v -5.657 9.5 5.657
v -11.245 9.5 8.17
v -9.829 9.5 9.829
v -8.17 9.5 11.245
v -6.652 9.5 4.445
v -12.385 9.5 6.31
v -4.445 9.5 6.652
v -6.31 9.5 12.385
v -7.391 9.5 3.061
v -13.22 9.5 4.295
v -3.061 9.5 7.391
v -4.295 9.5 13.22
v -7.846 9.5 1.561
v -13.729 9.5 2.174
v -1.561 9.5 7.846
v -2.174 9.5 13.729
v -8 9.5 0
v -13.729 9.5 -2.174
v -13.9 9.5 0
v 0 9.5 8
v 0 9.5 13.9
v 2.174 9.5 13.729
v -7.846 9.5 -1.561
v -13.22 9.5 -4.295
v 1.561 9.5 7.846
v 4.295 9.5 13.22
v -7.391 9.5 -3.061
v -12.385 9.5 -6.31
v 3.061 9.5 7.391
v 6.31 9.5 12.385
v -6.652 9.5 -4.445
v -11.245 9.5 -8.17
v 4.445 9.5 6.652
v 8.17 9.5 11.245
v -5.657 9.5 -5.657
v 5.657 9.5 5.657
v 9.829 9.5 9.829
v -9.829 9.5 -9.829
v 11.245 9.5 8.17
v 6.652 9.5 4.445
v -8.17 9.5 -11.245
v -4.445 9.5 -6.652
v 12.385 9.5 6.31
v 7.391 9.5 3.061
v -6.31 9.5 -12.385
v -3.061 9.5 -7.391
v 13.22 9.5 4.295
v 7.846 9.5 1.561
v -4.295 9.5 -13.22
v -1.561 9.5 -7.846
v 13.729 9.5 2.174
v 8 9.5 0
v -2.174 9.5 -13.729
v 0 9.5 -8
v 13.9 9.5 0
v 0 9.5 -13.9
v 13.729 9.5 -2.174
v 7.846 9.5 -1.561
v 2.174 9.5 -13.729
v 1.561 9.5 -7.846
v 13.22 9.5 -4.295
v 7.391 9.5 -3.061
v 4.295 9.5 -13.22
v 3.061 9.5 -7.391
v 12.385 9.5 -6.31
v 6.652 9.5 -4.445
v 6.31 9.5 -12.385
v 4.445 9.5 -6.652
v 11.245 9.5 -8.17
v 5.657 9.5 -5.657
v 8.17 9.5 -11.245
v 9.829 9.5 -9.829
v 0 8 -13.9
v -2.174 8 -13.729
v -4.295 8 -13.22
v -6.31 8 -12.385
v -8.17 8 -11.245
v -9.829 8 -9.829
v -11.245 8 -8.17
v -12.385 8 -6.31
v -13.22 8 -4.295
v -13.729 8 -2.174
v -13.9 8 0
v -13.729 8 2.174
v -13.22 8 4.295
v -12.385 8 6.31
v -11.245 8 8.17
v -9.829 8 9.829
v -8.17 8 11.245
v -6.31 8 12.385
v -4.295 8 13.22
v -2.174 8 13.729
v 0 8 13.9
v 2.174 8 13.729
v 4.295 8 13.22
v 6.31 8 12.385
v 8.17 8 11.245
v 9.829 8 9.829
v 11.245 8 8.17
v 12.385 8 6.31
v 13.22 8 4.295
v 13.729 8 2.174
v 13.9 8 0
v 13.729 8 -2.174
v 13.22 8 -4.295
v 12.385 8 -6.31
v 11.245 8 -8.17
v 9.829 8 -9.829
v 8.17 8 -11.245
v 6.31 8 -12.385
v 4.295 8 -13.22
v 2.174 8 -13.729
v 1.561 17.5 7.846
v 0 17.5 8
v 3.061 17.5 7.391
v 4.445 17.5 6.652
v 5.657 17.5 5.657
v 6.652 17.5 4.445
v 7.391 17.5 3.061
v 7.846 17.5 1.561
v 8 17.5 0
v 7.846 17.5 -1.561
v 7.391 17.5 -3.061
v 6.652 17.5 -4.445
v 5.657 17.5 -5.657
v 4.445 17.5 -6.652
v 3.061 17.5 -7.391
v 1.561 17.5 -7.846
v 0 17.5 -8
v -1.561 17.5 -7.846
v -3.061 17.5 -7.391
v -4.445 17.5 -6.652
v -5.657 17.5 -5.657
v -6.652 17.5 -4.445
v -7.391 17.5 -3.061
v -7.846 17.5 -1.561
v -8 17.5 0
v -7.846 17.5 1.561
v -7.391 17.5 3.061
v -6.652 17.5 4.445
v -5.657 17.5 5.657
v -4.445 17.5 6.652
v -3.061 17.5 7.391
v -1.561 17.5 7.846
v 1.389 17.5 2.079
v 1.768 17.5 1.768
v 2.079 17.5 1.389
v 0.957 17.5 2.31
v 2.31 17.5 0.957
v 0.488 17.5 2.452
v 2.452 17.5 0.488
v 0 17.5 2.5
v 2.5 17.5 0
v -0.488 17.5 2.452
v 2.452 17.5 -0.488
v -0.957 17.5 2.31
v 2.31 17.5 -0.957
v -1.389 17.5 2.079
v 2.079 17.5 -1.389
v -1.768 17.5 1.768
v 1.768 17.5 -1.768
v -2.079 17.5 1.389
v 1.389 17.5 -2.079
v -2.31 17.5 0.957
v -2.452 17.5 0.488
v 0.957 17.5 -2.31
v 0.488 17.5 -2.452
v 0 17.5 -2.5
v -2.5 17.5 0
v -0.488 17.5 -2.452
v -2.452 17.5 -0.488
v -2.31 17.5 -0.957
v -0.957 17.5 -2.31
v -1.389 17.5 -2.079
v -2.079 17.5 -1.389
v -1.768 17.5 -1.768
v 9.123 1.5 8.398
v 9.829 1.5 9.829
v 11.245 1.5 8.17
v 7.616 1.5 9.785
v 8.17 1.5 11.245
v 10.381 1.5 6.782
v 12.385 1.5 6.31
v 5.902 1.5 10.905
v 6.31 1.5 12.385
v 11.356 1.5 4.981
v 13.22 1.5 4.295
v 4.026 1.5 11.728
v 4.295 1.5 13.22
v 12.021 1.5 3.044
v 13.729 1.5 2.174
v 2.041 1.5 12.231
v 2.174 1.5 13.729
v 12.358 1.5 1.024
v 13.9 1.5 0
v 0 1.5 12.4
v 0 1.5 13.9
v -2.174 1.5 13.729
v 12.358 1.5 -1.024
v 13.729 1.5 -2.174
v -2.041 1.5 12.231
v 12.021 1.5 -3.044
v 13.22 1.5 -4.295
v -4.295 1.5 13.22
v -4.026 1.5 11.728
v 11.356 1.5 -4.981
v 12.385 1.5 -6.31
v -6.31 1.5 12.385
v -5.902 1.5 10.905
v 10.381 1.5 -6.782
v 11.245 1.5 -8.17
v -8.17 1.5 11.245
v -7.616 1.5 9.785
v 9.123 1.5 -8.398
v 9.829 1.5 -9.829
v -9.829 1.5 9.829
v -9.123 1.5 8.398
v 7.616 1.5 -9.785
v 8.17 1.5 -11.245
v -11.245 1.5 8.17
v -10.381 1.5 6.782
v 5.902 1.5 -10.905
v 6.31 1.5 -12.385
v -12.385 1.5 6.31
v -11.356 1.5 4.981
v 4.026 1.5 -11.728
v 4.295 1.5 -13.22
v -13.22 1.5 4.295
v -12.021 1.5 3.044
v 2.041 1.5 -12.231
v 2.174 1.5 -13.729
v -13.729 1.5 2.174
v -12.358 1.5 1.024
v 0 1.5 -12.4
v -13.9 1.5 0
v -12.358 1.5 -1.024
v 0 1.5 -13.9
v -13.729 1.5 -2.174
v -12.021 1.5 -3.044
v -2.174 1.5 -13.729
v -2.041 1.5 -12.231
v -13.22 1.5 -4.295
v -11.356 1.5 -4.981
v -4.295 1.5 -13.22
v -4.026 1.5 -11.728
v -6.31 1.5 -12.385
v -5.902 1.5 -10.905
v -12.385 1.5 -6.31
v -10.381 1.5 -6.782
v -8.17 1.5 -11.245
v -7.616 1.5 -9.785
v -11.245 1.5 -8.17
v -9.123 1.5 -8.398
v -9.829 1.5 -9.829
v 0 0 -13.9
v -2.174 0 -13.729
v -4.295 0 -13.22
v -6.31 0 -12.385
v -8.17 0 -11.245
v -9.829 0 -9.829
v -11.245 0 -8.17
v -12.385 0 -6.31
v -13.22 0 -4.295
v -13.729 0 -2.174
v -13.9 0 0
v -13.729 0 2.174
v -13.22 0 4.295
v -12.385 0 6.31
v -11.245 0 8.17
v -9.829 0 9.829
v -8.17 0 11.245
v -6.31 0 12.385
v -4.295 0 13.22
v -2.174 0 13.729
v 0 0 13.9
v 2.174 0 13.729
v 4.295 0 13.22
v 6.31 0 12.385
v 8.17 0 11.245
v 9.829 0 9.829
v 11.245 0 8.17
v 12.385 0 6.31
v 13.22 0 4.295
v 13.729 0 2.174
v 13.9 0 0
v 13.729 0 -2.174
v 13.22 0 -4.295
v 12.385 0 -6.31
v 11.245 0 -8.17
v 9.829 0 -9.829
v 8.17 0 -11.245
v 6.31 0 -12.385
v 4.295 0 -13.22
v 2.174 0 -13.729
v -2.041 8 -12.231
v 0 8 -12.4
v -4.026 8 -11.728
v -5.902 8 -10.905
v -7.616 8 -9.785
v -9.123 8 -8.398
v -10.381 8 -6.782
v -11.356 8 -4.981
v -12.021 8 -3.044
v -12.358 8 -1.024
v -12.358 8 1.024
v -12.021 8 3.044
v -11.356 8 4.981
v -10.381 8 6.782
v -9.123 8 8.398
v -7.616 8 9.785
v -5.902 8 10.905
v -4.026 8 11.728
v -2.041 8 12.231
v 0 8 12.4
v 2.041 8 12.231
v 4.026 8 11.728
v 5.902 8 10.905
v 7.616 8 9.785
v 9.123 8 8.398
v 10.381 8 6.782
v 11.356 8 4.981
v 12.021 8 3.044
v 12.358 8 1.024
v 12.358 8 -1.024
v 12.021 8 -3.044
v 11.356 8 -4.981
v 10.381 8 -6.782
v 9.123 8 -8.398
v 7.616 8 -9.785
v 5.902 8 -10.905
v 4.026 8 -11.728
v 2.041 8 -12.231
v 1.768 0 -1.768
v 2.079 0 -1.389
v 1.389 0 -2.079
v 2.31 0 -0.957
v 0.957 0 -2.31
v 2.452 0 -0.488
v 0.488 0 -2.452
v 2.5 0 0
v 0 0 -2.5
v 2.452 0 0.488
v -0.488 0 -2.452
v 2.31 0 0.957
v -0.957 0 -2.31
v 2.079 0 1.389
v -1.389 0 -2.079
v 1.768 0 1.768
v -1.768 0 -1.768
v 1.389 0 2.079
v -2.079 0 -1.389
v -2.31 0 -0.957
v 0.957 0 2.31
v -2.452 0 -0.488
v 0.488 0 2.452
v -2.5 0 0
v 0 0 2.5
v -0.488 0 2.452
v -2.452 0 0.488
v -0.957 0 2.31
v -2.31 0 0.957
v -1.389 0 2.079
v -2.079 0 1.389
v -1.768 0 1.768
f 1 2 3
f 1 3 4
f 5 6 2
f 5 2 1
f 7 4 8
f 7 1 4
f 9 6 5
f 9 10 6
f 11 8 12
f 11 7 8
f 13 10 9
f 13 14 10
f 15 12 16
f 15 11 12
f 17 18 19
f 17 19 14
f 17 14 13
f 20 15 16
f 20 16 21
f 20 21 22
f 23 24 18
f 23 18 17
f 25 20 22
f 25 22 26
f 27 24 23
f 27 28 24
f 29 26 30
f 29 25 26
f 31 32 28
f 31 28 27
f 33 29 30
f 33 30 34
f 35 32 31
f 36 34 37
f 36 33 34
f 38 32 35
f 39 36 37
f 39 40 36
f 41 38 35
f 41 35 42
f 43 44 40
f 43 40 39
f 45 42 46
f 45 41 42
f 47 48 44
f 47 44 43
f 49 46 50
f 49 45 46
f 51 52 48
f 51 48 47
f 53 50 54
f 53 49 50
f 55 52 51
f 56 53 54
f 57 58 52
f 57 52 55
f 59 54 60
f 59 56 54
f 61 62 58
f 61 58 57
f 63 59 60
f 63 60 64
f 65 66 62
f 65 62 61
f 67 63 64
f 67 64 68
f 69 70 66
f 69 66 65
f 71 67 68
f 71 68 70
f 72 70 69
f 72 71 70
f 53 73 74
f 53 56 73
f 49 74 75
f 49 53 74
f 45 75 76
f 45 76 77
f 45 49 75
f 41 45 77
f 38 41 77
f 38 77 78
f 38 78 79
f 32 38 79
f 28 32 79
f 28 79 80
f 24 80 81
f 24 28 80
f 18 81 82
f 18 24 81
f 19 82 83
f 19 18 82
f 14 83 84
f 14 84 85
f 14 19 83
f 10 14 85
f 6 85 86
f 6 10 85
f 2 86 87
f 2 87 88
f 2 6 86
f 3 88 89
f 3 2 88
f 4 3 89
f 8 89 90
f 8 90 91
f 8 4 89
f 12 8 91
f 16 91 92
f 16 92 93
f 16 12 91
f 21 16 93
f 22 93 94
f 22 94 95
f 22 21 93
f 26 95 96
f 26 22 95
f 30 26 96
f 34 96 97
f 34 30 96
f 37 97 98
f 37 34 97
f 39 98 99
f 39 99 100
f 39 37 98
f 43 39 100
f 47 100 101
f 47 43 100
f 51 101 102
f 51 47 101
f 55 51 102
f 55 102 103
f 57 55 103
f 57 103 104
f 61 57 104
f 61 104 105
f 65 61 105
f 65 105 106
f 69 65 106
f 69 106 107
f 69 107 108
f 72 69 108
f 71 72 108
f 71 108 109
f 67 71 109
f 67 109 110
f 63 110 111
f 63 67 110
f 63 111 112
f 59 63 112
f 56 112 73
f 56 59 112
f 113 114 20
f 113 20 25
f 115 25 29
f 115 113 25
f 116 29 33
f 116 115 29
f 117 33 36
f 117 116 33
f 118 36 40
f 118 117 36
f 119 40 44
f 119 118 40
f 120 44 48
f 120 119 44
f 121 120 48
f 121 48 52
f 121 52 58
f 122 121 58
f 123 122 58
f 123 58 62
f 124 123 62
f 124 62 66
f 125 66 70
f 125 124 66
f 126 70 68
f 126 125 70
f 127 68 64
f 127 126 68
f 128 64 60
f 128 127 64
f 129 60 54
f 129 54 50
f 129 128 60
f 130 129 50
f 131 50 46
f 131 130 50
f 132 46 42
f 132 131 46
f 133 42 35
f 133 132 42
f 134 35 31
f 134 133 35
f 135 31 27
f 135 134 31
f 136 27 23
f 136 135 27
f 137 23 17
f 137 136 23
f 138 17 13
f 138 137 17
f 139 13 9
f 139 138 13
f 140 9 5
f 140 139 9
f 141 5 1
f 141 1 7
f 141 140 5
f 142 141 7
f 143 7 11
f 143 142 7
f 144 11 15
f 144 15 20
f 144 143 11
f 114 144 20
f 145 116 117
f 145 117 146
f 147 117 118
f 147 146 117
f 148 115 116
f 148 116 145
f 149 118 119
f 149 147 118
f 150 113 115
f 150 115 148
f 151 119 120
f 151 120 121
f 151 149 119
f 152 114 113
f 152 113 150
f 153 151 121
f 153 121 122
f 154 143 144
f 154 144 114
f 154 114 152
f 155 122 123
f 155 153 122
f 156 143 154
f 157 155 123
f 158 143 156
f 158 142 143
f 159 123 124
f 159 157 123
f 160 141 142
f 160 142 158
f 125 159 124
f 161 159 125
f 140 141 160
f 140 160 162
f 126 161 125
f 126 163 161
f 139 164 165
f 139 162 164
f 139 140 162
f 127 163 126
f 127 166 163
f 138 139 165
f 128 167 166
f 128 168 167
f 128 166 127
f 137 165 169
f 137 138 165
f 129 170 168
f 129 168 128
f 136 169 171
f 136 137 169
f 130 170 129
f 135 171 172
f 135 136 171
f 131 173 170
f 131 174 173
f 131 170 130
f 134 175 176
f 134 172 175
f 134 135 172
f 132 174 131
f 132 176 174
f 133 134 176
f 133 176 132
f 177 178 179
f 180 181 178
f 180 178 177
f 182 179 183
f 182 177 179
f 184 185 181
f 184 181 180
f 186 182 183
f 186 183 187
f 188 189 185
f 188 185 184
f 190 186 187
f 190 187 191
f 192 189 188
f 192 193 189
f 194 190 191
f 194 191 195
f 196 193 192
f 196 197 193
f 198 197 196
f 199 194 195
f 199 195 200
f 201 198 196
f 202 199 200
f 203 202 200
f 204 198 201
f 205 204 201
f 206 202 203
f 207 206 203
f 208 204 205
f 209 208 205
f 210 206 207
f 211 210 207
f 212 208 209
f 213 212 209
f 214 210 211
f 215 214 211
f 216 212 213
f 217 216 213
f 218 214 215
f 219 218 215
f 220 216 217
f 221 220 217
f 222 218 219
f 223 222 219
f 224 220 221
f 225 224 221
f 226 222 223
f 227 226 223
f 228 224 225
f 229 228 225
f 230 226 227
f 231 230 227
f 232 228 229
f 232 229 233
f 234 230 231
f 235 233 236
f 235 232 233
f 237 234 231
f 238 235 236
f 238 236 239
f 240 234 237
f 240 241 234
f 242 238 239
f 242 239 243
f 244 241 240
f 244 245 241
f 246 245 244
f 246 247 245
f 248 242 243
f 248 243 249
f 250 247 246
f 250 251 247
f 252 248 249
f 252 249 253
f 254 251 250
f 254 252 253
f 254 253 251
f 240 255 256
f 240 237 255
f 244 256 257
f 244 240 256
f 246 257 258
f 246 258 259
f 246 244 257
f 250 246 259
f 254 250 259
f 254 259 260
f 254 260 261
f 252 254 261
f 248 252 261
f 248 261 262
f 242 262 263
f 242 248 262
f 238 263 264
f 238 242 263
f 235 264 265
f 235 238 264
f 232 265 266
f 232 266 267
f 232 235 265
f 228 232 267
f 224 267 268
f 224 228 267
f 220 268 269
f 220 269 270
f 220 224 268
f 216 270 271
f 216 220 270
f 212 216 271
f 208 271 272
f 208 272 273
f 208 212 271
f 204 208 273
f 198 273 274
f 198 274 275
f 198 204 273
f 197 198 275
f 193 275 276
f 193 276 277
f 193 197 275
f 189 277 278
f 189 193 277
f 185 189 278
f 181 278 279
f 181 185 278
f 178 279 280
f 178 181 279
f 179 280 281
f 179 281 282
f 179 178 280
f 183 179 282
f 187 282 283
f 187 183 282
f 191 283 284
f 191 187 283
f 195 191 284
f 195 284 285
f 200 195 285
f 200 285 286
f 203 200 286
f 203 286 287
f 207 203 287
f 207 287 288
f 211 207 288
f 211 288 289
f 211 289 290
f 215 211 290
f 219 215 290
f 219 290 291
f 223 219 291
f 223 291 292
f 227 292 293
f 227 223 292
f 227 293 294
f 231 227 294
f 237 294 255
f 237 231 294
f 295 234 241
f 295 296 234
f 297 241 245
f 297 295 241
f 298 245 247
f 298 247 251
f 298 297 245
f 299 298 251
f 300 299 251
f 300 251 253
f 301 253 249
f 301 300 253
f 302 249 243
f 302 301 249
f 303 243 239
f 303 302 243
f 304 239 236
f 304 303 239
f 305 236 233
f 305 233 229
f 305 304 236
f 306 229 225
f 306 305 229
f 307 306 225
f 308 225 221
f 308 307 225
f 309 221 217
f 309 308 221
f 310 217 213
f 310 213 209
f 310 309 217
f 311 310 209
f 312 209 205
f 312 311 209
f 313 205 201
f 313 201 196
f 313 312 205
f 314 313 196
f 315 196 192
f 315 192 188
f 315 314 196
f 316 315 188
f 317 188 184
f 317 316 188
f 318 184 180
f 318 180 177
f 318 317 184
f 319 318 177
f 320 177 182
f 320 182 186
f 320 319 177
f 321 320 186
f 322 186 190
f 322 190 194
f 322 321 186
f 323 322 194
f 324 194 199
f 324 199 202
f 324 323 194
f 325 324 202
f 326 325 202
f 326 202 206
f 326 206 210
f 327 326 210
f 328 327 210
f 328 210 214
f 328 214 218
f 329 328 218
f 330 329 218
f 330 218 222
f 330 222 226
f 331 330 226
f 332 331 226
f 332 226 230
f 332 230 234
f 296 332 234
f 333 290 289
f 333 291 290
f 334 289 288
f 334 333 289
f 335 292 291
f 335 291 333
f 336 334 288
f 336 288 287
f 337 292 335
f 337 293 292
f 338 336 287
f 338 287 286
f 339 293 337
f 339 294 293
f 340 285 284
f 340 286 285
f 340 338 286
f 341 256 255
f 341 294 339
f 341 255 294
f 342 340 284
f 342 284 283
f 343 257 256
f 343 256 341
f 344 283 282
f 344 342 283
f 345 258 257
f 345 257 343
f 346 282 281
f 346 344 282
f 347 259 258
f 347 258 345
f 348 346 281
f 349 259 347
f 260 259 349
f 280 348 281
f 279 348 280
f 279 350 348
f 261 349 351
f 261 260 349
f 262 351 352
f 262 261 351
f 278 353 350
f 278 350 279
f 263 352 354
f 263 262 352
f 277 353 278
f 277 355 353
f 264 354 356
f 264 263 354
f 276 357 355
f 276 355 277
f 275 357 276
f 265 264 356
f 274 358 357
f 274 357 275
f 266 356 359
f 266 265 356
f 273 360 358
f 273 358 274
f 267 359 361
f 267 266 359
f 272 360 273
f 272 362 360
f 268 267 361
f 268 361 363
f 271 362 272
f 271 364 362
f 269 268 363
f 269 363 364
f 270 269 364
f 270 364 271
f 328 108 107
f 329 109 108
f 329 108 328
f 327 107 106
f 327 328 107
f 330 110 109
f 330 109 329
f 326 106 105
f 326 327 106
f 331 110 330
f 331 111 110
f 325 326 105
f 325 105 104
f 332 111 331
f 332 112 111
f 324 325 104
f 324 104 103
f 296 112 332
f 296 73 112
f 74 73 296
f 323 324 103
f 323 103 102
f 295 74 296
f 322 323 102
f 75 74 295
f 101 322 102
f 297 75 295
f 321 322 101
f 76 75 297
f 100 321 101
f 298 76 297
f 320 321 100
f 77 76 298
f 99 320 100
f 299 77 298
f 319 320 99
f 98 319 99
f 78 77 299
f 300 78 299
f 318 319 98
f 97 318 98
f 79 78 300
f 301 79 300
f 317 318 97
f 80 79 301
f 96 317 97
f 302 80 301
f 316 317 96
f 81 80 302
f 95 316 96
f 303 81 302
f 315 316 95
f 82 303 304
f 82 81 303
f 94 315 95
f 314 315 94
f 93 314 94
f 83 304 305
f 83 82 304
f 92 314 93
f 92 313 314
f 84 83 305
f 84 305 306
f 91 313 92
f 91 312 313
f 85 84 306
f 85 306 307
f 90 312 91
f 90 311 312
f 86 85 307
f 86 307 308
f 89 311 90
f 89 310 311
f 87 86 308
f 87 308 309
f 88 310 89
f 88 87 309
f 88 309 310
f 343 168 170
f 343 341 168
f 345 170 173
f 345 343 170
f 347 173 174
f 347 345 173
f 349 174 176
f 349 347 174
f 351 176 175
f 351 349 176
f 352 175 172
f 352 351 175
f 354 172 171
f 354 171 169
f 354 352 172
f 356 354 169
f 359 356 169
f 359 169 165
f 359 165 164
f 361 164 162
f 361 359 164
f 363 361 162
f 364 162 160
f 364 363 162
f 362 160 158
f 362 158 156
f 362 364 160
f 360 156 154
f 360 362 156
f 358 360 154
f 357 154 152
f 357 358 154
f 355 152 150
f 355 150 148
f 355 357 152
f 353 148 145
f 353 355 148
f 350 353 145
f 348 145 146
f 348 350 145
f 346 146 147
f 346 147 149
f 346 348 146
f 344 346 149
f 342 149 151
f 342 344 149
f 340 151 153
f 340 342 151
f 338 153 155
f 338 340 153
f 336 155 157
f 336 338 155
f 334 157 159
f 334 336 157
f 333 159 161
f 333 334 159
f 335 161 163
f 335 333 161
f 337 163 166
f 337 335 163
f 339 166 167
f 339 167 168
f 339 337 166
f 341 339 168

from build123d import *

# Parameters (mm, degrees)
ESQUISSE2_R             = 8.85
ESQUISSE2_R_2           = 8
ENL_V_MAT_EXTRU_1_DEPTH = 8


with BuildPart() as part:
    # Esquisse1 → Révolution1 (revolve)
    with BuildSketch(Plane.XY, mode=Mode.PRIVATE) as r_volution1_sk:
        Polygon((2.5, 0), (13.9, 0), (13.9, 1.5), (12.4, 1.5), (12.4, 8), (13.9, 8), (13.9, 9.5), (8.85, 9.5), (8.85, 17.5), (2.5, 17.5), align=None)
    revolve(r_volution1_sk.sketch.rotate(Axis((0, 0, 0), (0, 1, 0)), 90), axis=Axis((0, 0, 0), (0, 1, 0)))

    # Esquisse2 → Enlèv. mat.-Extru.1 (cut)
    with BuildSketch(Plane(origin=(0, 17.5, 0), x_dir=(1, 0, 0), z_dir=(0, 1, 0))):
        Circle(ESQUISSE2_R)
        with Locations(Location((0, 0, 0), (0, 0, 270))):
            Circle(ESQUISSE2_R_2, mode=Mode.SUBTRACT)
    extrude(amount=-ENL_V_MAT_EXTRU_1_DEPTH, mode=Mode.SUBTRACT)


solid = part.part
